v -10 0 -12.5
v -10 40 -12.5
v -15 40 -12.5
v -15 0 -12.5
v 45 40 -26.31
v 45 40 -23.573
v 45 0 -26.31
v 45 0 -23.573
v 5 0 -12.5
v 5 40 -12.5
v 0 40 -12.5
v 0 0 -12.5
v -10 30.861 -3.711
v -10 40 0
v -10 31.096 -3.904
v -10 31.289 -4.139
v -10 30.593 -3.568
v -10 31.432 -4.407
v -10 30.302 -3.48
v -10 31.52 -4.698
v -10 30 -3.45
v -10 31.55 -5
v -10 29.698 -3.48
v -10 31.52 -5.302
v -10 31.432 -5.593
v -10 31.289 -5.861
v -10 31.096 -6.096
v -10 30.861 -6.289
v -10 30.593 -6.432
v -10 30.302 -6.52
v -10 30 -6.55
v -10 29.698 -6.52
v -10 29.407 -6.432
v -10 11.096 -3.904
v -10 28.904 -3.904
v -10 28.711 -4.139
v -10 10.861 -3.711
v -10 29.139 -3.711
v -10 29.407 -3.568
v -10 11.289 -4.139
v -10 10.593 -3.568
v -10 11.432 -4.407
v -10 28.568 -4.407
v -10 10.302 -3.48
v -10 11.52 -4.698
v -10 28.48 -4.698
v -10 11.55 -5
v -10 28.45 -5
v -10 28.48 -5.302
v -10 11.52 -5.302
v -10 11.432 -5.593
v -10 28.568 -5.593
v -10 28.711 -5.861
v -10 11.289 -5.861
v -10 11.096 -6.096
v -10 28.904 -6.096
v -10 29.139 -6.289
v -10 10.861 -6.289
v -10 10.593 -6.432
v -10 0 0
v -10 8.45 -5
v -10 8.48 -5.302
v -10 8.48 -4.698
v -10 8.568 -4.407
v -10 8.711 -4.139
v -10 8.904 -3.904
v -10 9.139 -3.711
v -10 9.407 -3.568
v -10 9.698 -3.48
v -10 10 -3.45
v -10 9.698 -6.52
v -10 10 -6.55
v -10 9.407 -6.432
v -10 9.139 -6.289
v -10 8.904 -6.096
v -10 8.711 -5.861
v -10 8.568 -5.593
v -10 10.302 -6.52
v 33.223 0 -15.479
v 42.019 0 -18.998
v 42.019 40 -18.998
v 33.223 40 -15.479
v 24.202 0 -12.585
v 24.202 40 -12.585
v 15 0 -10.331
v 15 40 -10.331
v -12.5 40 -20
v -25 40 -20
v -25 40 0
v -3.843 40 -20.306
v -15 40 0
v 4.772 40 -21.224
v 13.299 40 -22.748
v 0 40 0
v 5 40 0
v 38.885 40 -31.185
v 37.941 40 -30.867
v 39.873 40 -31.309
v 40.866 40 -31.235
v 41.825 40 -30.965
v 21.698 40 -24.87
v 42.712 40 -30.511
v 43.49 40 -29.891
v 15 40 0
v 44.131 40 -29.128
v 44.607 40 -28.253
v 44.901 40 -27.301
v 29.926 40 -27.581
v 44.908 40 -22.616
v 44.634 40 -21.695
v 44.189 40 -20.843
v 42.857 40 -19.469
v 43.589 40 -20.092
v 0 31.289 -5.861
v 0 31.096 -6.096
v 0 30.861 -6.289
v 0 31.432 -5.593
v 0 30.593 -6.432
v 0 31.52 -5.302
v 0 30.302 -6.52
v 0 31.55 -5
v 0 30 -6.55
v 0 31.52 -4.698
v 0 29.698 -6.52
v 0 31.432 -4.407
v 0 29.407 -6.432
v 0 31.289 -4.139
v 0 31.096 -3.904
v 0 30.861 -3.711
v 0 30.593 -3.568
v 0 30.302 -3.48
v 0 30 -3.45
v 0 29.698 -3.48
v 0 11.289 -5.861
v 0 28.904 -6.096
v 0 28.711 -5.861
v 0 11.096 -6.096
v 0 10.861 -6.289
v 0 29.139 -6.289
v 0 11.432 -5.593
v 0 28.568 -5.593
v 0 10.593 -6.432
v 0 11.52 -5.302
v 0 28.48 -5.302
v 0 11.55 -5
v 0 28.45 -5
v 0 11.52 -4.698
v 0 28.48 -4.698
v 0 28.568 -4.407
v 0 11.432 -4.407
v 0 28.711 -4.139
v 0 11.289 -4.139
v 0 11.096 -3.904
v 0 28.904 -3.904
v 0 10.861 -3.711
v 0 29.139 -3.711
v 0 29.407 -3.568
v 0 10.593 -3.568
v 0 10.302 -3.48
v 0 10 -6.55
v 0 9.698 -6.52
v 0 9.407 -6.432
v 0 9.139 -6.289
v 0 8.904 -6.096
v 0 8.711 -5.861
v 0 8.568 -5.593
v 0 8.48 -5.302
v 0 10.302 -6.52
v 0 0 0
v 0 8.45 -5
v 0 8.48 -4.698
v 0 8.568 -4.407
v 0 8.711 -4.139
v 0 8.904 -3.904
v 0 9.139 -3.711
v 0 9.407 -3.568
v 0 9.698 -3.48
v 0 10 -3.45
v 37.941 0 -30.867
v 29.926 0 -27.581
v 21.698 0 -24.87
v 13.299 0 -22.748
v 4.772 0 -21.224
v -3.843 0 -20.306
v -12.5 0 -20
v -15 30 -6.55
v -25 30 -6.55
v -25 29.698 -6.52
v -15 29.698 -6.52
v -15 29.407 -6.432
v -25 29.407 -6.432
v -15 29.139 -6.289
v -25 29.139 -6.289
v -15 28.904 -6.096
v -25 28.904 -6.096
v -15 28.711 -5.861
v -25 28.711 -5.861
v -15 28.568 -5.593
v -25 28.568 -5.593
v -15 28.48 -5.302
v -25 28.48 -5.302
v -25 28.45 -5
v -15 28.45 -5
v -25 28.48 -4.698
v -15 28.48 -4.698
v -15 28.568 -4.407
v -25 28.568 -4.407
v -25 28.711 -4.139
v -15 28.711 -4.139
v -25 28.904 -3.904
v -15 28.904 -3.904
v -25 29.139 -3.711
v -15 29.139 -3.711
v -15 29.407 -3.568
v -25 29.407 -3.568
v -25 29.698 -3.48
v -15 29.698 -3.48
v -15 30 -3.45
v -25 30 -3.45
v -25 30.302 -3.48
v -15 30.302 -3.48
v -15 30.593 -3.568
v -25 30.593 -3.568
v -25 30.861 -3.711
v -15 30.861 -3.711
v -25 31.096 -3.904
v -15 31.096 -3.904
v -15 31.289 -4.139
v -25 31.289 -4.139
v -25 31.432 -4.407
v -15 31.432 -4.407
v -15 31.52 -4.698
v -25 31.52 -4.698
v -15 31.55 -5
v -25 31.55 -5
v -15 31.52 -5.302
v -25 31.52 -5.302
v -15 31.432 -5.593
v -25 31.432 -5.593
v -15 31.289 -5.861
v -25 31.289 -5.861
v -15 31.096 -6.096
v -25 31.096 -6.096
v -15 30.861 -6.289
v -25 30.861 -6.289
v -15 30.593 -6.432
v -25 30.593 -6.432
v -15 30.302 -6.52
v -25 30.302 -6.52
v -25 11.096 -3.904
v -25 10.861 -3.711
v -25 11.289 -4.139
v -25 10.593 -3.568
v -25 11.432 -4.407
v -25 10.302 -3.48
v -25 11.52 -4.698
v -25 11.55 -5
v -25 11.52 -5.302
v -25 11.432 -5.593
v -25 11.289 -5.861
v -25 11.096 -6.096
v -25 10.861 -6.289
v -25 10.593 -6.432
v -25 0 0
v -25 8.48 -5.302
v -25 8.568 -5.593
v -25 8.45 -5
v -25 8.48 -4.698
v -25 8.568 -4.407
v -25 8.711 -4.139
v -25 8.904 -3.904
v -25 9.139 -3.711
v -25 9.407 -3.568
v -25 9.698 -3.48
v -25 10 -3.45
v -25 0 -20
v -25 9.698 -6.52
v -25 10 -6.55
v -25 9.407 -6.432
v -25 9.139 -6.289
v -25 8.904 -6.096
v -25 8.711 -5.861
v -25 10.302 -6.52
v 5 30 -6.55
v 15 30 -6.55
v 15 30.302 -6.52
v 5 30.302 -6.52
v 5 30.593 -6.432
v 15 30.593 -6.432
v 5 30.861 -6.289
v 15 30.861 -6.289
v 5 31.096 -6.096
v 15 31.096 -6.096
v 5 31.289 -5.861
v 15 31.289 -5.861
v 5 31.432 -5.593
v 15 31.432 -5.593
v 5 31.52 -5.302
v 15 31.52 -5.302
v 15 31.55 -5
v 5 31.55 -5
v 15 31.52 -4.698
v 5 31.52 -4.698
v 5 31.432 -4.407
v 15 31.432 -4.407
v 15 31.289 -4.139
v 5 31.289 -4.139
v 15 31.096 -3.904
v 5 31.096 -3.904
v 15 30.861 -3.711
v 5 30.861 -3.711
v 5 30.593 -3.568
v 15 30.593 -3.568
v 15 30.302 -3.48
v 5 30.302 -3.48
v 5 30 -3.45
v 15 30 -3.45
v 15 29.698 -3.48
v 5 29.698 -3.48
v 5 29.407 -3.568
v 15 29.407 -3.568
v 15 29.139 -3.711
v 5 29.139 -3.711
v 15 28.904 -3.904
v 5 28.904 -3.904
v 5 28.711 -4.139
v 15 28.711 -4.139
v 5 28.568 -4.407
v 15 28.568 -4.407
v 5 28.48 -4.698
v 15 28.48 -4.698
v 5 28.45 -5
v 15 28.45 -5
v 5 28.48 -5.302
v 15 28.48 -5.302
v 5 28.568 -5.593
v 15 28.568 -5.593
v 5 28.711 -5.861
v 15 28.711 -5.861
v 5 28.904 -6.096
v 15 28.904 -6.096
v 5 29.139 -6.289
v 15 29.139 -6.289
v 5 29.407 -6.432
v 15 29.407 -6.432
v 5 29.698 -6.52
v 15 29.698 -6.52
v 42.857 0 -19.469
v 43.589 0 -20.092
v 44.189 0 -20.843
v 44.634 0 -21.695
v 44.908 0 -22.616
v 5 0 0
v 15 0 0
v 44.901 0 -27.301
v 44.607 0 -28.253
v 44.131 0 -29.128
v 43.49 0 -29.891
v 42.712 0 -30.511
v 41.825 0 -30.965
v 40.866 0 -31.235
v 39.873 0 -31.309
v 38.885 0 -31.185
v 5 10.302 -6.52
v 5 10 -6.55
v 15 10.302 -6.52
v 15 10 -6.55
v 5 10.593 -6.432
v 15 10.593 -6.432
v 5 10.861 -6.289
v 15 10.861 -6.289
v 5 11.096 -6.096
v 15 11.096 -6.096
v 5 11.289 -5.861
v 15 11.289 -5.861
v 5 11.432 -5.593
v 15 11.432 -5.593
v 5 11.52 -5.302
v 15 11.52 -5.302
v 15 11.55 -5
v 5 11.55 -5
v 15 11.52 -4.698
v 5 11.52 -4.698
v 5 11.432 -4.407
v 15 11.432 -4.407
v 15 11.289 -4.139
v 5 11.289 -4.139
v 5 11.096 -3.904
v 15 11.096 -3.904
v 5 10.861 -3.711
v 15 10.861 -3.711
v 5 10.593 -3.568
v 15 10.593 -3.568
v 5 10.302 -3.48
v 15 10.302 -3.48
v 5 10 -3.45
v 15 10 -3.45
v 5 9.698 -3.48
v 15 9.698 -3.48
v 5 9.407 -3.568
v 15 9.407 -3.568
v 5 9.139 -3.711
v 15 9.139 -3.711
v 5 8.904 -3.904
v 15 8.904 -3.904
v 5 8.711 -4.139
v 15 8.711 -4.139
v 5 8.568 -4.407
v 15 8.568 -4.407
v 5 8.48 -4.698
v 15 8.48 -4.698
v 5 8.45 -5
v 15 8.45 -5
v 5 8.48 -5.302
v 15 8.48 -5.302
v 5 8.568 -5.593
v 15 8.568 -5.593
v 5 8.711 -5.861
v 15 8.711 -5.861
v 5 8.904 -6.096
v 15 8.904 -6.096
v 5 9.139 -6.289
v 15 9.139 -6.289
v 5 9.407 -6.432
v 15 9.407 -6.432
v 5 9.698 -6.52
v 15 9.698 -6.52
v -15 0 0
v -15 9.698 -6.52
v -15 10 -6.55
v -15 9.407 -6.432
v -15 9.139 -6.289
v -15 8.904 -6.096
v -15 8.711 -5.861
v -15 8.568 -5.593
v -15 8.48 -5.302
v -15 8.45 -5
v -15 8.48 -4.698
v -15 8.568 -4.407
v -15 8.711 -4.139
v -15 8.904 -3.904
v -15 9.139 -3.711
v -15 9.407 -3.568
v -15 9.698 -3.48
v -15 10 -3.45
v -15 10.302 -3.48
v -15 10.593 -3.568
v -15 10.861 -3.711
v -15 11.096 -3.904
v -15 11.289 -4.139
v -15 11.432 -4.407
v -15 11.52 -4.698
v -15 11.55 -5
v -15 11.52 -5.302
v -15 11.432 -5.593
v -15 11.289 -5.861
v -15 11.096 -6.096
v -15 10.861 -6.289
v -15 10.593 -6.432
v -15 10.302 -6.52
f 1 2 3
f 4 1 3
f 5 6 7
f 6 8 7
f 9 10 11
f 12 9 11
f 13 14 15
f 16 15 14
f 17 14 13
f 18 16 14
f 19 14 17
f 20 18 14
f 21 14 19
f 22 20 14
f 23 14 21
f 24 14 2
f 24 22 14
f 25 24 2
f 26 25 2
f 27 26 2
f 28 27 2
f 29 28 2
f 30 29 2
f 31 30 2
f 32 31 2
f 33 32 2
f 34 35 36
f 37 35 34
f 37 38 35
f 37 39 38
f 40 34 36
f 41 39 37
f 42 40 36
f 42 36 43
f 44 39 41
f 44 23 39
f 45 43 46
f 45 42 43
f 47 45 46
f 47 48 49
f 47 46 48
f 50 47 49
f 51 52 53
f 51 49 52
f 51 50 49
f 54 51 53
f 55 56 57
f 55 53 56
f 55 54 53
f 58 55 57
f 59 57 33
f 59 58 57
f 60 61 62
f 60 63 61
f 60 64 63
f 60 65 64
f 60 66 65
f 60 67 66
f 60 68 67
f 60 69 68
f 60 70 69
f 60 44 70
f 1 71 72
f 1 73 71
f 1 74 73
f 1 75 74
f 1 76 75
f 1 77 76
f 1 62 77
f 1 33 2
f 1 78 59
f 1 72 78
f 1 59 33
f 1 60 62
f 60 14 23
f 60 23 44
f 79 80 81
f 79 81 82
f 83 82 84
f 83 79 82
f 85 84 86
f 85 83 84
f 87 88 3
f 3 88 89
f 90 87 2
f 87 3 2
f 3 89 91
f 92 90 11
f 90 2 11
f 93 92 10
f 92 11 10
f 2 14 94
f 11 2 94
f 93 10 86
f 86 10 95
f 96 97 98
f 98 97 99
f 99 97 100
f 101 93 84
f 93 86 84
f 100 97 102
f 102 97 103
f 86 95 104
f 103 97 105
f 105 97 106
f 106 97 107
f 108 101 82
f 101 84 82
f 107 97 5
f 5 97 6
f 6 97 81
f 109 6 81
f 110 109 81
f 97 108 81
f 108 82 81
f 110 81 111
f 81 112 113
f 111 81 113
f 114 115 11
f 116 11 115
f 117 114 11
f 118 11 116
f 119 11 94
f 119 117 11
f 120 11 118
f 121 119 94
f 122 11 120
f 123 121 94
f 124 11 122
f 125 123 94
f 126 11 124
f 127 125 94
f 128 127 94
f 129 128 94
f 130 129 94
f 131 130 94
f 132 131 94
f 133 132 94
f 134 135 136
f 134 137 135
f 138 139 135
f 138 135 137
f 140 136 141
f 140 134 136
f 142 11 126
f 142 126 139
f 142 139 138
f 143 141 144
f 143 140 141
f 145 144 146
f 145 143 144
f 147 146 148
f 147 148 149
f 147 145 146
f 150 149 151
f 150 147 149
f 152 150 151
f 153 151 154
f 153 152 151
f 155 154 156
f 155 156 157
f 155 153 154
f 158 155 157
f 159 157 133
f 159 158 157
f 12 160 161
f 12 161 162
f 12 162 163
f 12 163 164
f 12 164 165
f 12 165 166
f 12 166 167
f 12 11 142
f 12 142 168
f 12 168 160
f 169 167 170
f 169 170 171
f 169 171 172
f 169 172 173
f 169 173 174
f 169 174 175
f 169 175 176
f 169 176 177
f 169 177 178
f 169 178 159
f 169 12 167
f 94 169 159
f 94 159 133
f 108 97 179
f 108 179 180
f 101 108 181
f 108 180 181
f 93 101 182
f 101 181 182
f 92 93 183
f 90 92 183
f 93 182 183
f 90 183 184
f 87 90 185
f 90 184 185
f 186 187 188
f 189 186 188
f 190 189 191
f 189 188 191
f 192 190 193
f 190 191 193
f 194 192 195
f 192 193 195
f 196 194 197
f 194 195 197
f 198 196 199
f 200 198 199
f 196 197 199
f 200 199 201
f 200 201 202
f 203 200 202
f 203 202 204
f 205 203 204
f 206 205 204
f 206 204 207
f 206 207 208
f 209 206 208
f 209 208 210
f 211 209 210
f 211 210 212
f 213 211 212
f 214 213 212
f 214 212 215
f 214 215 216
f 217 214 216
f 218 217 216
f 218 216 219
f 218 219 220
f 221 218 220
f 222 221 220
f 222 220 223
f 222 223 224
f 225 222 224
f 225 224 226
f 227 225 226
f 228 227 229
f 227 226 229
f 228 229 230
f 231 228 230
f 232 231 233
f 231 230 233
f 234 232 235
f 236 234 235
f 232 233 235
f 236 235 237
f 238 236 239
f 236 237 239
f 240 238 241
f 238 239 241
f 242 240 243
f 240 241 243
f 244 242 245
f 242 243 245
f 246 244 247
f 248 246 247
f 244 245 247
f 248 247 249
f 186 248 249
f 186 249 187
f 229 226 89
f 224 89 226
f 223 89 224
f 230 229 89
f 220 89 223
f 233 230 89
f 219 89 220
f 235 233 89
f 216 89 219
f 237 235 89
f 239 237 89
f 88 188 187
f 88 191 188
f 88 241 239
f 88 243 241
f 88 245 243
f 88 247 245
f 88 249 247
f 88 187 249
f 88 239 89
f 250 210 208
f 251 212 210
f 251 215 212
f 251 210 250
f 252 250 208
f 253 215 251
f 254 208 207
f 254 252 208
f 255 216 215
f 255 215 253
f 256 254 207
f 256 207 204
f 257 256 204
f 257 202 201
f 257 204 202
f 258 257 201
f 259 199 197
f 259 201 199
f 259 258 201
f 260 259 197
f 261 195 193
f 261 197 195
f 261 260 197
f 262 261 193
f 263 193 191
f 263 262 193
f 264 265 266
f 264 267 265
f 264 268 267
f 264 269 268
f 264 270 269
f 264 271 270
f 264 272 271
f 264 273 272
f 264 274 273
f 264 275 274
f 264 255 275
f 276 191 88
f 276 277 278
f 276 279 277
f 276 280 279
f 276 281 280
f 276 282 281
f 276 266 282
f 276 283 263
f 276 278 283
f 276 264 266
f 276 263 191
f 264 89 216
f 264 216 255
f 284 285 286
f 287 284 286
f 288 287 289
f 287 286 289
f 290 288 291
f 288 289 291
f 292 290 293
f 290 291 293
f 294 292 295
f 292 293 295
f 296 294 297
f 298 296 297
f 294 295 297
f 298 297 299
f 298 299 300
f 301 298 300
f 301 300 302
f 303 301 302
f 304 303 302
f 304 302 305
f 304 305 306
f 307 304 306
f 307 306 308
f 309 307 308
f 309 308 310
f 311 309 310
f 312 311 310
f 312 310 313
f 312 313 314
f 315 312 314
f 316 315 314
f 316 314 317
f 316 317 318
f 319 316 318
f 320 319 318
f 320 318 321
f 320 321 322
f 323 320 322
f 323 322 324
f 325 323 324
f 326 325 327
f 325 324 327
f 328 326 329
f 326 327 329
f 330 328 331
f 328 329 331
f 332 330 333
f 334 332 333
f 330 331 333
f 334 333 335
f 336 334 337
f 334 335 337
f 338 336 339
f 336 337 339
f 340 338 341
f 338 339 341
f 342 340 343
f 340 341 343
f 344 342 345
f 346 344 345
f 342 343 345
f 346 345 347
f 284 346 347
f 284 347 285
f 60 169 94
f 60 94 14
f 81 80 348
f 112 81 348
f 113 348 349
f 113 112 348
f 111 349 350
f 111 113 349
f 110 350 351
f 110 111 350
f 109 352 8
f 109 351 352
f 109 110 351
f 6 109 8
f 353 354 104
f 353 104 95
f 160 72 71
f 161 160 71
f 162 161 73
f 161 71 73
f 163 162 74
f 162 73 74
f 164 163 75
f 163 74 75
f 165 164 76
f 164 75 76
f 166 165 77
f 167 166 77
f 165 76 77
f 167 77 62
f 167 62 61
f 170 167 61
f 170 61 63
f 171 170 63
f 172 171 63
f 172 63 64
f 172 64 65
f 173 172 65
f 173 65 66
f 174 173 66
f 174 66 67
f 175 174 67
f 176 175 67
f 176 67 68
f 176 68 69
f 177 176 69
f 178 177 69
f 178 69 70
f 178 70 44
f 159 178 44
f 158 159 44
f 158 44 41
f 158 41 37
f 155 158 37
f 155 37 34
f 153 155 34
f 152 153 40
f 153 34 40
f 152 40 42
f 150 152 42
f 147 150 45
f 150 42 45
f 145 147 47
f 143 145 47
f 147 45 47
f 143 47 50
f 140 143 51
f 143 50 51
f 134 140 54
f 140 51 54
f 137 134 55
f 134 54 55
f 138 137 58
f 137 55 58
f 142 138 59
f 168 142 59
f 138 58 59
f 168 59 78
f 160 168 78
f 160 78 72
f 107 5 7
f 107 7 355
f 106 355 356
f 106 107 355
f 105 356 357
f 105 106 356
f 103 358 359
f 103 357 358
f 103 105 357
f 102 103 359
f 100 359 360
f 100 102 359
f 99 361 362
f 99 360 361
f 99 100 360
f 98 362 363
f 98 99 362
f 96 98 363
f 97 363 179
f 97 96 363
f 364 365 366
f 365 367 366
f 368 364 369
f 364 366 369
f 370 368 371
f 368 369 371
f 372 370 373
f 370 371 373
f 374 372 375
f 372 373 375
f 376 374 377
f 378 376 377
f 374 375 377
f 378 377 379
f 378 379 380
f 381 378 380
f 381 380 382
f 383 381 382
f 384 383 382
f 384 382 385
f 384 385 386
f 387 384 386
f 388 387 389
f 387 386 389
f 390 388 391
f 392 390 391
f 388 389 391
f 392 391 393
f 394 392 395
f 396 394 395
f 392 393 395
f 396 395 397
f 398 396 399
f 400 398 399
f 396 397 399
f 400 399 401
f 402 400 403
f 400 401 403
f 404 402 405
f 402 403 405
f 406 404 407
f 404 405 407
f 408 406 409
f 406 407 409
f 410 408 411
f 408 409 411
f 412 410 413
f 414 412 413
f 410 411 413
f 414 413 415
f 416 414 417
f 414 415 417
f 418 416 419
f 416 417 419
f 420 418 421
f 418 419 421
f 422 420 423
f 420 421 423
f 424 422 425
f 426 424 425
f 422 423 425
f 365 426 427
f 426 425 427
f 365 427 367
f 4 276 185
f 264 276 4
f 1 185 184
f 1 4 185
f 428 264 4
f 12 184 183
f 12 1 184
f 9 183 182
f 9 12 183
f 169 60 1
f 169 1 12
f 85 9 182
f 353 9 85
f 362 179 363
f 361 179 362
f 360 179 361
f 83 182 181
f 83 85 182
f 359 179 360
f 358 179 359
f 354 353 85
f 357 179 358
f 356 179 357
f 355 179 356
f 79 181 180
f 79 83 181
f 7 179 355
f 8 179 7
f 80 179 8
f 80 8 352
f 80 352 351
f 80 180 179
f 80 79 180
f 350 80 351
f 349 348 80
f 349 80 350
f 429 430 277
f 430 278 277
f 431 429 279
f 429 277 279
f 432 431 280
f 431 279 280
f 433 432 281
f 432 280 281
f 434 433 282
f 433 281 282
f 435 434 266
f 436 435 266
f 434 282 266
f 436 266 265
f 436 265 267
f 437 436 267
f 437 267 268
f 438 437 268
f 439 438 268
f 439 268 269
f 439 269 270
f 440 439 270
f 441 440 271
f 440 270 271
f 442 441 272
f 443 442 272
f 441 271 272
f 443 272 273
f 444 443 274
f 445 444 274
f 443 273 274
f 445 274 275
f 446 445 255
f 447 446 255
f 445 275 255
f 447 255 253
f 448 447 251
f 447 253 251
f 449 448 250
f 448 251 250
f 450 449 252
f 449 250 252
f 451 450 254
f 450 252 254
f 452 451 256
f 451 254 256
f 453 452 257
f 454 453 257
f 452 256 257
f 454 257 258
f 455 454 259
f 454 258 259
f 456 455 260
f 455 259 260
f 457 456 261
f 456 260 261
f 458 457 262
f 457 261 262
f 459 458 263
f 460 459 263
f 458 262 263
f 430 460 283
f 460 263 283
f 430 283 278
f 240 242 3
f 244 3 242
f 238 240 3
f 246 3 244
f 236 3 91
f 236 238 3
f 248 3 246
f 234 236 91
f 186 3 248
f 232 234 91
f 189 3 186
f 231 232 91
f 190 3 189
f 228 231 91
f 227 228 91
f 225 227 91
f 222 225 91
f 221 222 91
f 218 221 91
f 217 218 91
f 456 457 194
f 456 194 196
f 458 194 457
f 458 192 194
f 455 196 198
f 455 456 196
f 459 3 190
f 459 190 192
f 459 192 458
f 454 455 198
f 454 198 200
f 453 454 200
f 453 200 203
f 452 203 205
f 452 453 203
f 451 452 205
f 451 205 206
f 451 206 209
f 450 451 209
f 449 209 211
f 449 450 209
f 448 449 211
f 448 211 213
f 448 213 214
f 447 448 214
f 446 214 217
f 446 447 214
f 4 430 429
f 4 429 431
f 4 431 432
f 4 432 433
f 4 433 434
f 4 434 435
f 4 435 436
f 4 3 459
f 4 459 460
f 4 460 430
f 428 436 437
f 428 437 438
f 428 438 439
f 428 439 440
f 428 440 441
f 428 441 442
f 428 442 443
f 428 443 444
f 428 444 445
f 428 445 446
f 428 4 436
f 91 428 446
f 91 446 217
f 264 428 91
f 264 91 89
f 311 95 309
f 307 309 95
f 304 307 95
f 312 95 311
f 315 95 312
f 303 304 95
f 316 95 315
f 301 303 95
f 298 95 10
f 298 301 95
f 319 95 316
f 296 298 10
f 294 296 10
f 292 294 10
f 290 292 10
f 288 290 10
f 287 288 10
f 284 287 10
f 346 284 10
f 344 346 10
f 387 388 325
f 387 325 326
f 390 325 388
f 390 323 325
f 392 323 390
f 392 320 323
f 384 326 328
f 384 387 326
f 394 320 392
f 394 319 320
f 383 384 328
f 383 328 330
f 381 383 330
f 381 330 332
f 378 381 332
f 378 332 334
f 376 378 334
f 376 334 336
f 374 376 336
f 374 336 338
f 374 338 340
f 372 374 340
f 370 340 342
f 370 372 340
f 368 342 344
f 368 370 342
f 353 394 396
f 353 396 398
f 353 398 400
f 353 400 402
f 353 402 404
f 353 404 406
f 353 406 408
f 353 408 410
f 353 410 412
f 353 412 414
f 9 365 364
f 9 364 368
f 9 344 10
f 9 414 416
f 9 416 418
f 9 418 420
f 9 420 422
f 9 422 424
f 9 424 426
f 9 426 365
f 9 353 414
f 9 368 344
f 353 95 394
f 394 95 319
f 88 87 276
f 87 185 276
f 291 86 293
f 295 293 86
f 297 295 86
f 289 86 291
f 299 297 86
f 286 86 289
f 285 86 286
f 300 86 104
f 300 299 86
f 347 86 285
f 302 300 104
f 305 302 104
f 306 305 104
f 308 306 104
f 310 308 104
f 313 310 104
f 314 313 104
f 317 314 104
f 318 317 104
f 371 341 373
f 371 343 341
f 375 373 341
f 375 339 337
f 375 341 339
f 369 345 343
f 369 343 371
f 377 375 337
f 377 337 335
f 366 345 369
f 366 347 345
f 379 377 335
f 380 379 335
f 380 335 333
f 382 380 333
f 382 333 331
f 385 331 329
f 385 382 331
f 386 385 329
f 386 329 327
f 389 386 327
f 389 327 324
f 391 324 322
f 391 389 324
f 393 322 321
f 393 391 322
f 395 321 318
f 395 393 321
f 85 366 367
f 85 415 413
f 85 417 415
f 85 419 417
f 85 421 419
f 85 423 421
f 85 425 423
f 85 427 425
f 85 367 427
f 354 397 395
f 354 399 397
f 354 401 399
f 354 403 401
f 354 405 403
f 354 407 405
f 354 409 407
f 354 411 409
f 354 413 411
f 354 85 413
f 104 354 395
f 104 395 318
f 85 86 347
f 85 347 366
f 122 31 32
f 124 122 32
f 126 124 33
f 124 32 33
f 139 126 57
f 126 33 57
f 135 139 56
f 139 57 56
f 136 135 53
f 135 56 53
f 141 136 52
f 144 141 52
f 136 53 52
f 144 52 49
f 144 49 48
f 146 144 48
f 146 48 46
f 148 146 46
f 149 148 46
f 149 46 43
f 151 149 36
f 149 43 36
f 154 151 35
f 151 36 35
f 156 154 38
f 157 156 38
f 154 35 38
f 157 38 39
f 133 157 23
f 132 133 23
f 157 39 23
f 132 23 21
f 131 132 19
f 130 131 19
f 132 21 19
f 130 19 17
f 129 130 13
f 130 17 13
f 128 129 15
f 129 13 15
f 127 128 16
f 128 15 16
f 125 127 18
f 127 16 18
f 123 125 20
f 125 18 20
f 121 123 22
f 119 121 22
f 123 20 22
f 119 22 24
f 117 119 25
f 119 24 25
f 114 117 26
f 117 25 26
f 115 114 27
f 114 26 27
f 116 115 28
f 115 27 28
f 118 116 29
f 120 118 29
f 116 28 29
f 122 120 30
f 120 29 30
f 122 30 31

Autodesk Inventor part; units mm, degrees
ref_plane "YZ Plane" through (0, 0, 0) normal (1, 0, 0) x (0, 1, 0)
ref_plane "XZ Plane" through (0, 0, 0) normal (0, 1, 0) x (-1, 0, 0)
ref_plane "XY Plane" through (0, 0, 0) normal (0, 0, 1) x (1, 0, 0)
sketch "スケッチ3" plane through (0, 0, 0) normal (0, 1, 0) x (-1, 0, 0)
  line L0 (0, 0) -> (25, 0)
  line L1 (25, 0) -> (25, -12.5)
  line L2 (25, -12.5) -> (0, -12.5)
  line L3 (0, -12.5) -> (0, 0)
  line L4 (15, 0) -> (10, 0)
  line L5 (10, 0) -> (10, -12.5)
  line L6 (10, -12.5) -> (15, -12.5)
  line L7 (15, -12.5) -> (15, 0)
  dimension "d112" = 25
  dimension "d113" = 12.5
  dimension "d114" = 5
  dimension "d115" = 10
extrude "押し出し1" add sketch "スケッチ3" along normal blind 40 contours L0 L5 L2 L3 | L0 L1 L2 L7
sketch "スケッチ4" plane through (0, 0, 0) normal (1, 0, 0) x (0, 0, -1)
  line L0 (12.5, 0) -> (0, 0) projected
  line L1 (5, 0) -> (5, 40)
  line L2 (0, 40) -> (12.5, 40) projected
  line L3 (12.5, 0) -> (12.5, 40) projected
  line L4 (0, 0) -> (0, 40) projected
  line L5 (0, 20) -> (12.5, 20)
  point P0 (5, 30)
  point P1 (5, 10)
  dimension "d118" = 7.5
  dimension "d119" = 20
  dimension "d120" = 20
hole "穴1" at (0, 30, -5) at (0, 10, -5) direction (-1, 0, 0) diameter 3.1 end through all
sketch "スケッチ5" plane through (0, 0, 0) normal (0, -1, 0) x (1, 0, 0)
  line L0 (0, -12.5) -> (-10, -12.5) projected
  line L1 (0, -12.5) -> (-25, -12.5)
  line L2 (-25, -12.5) -> (-25, -17.5)
  line L3 (-25, -17.5) -> (0, -17.5)
  line L4 (0, -17.5) -> (0, -12.5)
  point P0 (0, 0)
  dimension "d128" = 5
extrude "押し出し2" add sketch "スケッチ5" against normal blind 40
sketch "スケッチ6" plane through (0, 0, 0) normal (0, -1, 0) x (1, 0, 0)
  line L0 (-15, -12.5) -> (-10, -12.5) projected
  line L1 (-12.5, -12.5) -> (-12.5, -232.0211)
  circle A0 centre (-12.5, -142.5) radius 122.5
  line L2 (-25, -17.5) -> (0, -17.5) projected
  circle A1 centre (-12.5, -142.5) radius 135
  line L3 (0, 0) -> (0, -17.5) projected
  line L4 (0, -17.5) -> (5, -17.5)
  line L5 (5, -17.5) -> (5, -12.5)
  line L6 (5, -12.5) -> (0, -12.5)
  line L7 (0, -12.5) -> (0, -17.5)
  line L8 (5, -17.5) -> (15, -17.5)
  line L9 (15, -17.5) -> (15, 0)
  line L10 (15, 0) -> (5, 0)
  line L11 (5, 0) -> (5, -17.5)
  line L12 (45, -20.3577) -> (45, -34.3335)
  line L13 (-12.5, -20) -> (-25, -20)
  line L14 (-25, 0) -> (-25, -17.5) projected
  line L15 (-25, -20) -> (-25, -17.5)
  point P0 (0, -12.5)
  point P1 (-12.5, -17.5)
  point P2 (15, -10.3306)
  point P3 (0, -8.0799)
  point P4 (5, -8.6391)
  dimension "d132" = 270
  dimension "d131" = 245
  dimension "d133" = 5
  dimension "d134" = 5
  dimension "d135" = 10
  dimension "d136" = 17.5
  dimension "d139" = 30
  dimension "d144" = 125
extrude "押し出し3" add sketch "スケッチ6" against normal blind 40 contours L3 L6 L5 L4 | L5 L11 A1 L9 L8 | A1 L11 L10 L9
extrude "押し出し4" add sketch "スケッチ6" against normal blind 40 contours L2 L4 L8 L9 A1 L12 A0 L1 | L1 L13 L15 L2
sketch "スケッチ7" plane through (15, 0, 0) normal (1, 0, 0) x (0, 0, -1)
  circle A0 centre (5, 30) radius 1.55 projected
  circle A1 centre (5, 10) radius 1.55 projected
  point P0 (0, 0)
extrude "押し出し5" cut sketch "スケッチ7" against normal blind 40
fillet "フィレット1" radius 5 1 edges at (45, 20, -34.3335)
fillet "フィレット2" radius 5 1 edges at (45, 20, -20.3577)
properties part number "hand2_14" material "ABS プラスチック"
